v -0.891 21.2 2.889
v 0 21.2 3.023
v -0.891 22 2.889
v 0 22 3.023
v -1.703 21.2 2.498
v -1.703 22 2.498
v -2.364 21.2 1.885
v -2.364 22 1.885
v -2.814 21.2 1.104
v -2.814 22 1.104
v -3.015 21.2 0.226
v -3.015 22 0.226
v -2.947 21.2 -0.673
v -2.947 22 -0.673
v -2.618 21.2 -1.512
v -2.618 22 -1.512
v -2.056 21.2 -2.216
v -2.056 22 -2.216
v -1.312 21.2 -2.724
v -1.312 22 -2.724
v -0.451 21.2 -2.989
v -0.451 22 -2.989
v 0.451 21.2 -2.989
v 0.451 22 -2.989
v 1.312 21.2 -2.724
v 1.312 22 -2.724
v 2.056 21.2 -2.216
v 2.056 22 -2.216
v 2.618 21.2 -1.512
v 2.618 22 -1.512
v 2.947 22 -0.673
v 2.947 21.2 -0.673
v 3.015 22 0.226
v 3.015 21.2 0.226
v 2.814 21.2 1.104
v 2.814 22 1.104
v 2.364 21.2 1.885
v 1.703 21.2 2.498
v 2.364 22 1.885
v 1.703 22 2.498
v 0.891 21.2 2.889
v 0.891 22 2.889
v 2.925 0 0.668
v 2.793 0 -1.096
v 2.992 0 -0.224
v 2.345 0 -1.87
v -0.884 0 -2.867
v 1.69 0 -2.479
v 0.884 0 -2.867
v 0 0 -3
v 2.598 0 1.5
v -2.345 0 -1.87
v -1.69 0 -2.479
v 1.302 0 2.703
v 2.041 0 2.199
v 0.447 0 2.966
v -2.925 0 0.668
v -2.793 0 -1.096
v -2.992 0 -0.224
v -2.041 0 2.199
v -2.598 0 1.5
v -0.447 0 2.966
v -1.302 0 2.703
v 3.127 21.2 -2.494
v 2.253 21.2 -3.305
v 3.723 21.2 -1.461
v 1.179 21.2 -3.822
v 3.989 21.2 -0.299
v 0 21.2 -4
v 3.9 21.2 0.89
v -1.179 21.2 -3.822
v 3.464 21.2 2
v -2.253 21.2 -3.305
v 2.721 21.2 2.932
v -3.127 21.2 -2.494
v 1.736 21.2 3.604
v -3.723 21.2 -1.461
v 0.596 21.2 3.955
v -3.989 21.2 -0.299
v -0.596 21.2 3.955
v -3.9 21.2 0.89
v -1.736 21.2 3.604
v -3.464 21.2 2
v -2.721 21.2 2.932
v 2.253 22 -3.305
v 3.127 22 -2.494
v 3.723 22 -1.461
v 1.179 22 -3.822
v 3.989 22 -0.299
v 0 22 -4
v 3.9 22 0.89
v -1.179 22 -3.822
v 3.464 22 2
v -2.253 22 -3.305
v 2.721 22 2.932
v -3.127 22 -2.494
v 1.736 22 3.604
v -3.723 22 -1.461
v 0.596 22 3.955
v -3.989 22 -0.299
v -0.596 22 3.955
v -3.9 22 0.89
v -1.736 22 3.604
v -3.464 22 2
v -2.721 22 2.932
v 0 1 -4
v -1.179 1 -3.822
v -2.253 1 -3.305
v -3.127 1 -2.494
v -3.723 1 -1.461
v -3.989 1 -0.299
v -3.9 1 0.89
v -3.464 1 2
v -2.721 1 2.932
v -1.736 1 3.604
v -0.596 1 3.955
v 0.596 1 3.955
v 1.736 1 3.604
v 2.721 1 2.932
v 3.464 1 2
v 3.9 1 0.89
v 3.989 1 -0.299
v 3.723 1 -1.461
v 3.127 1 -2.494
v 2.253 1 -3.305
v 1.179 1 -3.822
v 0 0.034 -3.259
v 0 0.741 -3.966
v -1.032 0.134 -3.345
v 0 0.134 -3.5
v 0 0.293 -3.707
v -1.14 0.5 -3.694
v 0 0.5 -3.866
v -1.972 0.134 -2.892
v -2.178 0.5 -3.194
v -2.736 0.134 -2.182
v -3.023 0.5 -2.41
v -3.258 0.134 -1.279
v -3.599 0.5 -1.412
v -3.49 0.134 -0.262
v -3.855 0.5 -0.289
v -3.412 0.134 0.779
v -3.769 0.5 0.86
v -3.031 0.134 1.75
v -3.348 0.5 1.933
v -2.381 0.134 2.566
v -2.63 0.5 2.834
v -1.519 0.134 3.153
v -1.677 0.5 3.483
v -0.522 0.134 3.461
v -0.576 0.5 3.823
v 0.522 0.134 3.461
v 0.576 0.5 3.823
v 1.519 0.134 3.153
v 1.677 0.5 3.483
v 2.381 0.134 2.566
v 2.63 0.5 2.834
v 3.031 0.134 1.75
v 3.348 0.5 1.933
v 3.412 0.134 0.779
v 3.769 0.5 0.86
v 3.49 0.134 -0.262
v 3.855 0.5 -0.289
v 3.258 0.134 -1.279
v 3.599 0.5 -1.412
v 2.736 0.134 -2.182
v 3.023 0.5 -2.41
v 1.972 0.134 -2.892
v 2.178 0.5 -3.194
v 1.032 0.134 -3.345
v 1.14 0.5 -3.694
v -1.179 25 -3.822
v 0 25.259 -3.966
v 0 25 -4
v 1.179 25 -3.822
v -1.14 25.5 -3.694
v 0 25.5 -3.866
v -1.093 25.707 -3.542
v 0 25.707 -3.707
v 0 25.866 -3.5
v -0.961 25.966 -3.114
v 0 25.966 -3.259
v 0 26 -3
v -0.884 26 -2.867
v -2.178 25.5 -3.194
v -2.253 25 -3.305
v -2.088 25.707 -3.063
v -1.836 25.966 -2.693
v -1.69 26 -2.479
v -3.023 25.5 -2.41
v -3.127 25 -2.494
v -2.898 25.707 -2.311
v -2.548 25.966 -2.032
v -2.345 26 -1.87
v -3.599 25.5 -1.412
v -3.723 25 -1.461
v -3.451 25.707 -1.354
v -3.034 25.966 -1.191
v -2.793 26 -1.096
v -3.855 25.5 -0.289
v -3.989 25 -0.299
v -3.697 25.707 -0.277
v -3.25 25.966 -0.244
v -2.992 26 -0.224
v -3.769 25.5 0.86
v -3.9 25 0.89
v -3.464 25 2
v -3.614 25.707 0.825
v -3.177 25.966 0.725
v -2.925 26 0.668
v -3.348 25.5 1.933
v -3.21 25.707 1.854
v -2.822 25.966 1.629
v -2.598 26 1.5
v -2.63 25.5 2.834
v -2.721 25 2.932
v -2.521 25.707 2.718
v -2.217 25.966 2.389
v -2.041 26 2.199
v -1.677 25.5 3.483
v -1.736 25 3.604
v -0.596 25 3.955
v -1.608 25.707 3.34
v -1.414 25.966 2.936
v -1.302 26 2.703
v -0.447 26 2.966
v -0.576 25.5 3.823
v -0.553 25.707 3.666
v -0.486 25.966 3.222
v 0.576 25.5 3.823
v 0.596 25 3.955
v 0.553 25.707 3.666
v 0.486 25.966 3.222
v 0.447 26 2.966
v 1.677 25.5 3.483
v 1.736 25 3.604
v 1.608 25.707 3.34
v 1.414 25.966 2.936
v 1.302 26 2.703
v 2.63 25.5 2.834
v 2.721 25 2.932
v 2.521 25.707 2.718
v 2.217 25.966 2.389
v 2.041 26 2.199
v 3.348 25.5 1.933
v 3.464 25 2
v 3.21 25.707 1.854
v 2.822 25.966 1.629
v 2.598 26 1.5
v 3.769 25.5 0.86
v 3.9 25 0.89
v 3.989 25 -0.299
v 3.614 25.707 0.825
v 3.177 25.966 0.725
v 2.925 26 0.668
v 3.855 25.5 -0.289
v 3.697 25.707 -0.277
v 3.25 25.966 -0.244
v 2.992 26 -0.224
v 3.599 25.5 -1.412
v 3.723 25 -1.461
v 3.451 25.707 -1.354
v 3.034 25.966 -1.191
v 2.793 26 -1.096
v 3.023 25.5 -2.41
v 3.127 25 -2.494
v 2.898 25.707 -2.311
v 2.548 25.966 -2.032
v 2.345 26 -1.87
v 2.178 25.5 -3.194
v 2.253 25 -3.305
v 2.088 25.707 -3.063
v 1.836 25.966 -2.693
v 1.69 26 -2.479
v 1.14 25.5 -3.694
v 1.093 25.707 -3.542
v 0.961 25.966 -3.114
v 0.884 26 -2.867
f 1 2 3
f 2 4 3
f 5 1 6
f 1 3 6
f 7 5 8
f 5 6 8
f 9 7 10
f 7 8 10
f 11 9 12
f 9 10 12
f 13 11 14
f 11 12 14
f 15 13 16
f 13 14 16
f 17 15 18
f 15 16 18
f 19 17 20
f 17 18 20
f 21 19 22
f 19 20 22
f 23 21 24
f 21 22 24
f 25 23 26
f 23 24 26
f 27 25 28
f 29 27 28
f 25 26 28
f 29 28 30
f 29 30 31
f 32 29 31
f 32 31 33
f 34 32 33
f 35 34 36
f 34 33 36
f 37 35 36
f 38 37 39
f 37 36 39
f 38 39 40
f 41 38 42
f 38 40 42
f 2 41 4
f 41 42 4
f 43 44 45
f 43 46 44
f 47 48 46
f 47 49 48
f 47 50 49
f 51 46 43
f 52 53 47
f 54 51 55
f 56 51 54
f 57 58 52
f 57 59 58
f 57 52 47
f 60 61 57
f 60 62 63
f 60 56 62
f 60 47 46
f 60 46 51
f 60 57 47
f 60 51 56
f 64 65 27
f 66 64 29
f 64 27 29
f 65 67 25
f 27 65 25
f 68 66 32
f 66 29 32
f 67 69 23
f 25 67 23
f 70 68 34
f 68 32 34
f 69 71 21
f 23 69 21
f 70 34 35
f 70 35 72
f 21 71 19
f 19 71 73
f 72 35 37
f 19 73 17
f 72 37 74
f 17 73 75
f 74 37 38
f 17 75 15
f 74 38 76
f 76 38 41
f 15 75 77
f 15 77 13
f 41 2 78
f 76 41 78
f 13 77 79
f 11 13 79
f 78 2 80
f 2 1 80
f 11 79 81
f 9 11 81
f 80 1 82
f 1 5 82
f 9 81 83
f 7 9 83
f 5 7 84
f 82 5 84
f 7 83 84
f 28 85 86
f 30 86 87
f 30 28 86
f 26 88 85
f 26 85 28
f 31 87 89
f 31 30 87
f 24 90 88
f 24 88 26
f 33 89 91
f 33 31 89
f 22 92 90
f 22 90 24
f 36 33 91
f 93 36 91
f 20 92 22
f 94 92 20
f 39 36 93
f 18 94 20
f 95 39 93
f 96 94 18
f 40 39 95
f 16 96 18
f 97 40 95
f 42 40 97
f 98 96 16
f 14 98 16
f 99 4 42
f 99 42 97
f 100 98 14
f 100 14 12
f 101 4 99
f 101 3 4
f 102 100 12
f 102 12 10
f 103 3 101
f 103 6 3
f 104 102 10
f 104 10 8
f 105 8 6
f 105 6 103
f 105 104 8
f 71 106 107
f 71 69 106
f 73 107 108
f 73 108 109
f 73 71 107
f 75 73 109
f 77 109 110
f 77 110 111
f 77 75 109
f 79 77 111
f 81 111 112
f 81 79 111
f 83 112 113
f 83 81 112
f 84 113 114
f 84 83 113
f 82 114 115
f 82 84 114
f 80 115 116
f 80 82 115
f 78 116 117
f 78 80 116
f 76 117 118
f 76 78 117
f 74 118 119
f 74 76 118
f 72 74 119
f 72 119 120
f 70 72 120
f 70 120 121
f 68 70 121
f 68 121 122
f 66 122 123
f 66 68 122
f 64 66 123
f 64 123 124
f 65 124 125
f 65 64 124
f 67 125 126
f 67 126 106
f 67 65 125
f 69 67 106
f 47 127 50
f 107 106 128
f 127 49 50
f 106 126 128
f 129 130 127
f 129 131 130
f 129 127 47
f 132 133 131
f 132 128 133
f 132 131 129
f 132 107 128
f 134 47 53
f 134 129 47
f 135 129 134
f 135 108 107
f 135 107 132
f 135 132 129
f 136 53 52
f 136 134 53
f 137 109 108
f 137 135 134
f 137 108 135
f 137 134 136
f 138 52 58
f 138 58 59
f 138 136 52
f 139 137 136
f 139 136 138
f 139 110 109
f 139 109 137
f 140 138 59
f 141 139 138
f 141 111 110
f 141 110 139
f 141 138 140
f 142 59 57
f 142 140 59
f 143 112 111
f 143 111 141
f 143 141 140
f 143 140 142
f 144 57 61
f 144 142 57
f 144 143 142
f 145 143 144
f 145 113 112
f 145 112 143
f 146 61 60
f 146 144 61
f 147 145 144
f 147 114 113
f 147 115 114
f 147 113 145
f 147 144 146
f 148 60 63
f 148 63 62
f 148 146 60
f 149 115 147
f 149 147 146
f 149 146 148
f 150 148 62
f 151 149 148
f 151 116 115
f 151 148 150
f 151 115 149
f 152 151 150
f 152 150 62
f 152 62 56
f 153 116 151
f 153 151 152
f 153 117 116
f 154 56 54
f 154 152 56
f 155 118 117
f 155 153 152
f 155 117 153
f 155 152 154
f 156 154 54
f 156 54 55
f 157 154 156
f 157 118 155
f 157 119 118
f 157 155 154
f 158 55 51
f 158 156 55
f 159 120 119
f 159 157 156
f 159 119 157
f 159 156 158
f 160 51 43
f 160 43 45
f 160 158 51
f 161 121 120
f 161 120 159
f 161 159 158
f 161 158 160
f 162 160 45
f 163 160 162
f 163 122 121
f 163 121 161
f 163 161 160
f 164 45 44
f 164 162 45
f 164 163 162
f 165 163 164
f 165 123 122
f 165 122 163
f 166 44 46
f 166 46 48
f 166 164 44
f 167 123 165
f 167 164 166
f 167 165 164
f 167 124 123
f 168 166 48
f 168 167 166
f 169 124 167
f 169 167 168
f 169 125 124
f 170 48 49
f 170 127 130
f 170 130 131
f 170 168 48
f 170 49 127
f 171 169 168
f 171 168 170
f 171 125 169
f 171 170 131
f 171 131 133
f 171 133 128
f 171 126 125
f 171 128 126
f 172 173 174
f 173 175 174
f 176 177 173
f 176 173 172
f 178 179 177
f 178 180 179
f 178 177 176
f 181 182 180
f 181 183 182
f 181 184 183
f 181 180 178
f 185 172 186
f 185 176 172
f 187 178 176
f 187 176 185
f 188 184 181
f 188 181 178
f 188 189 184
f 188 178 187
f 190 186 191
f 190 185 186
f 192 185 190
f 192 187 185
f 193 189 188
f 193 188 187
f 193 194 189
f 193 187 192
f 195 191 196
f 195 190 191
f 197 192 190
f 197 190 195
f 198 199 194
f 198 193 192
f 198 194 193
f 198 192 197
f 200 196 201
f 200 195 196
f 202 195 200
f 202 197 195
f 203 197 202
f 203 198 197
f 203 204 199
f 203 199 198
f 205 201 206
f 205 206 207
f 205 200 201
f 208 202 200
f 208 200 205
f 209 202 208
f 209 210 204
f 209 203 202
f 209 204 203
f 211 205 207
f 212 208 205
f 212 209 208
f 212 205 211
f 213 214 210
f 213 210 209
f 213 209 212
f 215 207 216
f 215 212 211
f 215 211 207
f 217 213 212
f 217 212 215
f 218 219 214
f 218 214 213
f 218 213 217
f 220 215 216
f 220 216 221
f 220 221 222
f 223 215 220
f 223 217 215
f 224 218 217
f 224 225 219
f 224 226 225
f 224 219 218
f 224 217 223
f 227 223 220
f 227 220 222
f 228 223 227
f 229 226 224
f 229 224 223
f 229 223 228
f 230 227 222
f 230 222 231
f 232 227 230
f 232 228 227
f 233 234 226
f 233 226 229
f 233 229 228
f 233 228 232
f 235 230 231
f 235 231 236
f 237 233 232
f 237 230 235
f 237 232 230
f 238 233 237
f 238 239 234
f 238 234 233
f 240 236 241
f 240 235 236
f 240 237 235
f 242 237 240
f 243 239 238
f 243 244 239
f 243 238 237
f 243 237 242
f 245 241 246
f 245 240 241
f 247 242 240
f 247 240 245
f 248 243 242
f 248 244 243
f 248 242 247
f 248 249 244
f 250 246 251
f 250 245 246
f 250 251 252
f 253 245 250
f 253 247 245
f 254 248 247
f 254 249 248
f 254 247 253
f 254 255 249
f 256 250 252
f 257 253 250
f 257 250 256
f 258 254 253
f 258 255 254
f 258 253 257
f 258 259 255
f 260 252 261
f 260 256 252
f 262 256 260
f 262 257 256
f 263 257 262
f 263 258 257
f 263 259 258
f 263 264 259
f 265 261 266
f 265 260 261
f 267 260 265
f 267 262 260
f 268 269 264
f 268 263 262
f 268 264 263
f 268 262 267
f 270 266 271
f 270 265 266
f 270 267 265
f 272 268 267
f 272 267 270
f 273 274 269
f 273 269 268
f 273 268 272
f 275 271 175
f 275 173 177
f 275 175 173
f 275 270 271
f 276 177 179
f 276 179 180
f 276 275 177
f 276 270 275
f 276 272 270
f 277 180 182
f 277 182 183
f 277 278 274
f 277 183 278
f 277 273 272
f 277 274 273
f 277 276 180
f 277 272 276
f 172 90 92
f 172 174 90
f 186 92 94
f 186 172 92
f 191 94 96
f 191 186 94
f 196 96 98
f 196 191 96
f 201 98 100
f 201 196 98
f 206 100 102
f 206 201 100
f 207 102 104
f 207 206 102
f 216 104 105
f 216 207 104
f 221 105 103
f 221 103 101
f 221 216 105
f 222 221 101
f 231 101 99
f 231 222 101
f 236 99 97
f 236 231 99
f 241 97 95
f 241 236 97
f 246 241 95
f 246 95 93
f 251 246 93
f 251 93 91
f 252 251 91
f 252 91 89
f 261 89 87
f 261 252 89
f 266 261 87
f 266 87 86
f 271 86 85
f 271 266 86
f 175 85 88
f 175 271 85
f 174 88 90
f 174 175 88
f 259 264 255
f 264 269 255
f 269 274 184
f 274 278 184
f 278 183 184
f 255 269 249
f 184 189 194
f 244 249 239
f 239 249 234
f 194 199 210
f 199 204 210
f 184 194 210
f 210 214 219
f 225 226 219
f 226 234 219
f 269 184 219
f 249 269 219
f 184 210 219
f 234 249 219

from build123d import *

# Parameters (mm, degrees)
ESQUISSE2_W = 4
ESQUISSE2_H = 26
CONG_2_R    = 1
ESQUISSE3_W = 1.417366919
ESQUISSE3_H = 0.8


with BuildPart() as part:
    # Esquisse2 → Révolution1 (revolve)
    with BuildSketch(Plane.XY, mode=Mode.PRIVATE) as r_volution1_sk:
        with Locations((2, 13)):
            Rectangle(ESQUISSE2_W, ESQUISSE2_H)
    revolve(r_volution1_sk.sketch.rotate(Axis((0, 0, 0), (0, 1, 0)), 90), axis=Axis((0, 0, 0), (0, 1, 0)))

    # Congé2
    cong_2_edges = [part.edges().sort_by_distance(p)[0] for p in [
        (0, 0, 4),
        (0, 26, 4),
    ]]
    fillet(cong_2_edges, radius=CONG_2_R)

    # Esquisse3 → Enlèvement de matière-Révolution1 (revolve, cut)
    with BuildSketch(Plane.XY, mode=Mode.PRIVATE) as enl_vement_de_mati_re_r_volution1_sk:
        with Locations((-3.731857201, 21.6)):
            Rectangle(ESQUISSE3_W, ESQUISSE3_H)
    revolve(enl_vement_de_mati_re_r_volution1_sk.sketch.rotate(Axis((0, 0, 0), (0, -1, 0)), 270), axis=Axis((0, 0, 0), (0, -1, 0)), mode=Mode.SUBTRACT)


solid = part.part
